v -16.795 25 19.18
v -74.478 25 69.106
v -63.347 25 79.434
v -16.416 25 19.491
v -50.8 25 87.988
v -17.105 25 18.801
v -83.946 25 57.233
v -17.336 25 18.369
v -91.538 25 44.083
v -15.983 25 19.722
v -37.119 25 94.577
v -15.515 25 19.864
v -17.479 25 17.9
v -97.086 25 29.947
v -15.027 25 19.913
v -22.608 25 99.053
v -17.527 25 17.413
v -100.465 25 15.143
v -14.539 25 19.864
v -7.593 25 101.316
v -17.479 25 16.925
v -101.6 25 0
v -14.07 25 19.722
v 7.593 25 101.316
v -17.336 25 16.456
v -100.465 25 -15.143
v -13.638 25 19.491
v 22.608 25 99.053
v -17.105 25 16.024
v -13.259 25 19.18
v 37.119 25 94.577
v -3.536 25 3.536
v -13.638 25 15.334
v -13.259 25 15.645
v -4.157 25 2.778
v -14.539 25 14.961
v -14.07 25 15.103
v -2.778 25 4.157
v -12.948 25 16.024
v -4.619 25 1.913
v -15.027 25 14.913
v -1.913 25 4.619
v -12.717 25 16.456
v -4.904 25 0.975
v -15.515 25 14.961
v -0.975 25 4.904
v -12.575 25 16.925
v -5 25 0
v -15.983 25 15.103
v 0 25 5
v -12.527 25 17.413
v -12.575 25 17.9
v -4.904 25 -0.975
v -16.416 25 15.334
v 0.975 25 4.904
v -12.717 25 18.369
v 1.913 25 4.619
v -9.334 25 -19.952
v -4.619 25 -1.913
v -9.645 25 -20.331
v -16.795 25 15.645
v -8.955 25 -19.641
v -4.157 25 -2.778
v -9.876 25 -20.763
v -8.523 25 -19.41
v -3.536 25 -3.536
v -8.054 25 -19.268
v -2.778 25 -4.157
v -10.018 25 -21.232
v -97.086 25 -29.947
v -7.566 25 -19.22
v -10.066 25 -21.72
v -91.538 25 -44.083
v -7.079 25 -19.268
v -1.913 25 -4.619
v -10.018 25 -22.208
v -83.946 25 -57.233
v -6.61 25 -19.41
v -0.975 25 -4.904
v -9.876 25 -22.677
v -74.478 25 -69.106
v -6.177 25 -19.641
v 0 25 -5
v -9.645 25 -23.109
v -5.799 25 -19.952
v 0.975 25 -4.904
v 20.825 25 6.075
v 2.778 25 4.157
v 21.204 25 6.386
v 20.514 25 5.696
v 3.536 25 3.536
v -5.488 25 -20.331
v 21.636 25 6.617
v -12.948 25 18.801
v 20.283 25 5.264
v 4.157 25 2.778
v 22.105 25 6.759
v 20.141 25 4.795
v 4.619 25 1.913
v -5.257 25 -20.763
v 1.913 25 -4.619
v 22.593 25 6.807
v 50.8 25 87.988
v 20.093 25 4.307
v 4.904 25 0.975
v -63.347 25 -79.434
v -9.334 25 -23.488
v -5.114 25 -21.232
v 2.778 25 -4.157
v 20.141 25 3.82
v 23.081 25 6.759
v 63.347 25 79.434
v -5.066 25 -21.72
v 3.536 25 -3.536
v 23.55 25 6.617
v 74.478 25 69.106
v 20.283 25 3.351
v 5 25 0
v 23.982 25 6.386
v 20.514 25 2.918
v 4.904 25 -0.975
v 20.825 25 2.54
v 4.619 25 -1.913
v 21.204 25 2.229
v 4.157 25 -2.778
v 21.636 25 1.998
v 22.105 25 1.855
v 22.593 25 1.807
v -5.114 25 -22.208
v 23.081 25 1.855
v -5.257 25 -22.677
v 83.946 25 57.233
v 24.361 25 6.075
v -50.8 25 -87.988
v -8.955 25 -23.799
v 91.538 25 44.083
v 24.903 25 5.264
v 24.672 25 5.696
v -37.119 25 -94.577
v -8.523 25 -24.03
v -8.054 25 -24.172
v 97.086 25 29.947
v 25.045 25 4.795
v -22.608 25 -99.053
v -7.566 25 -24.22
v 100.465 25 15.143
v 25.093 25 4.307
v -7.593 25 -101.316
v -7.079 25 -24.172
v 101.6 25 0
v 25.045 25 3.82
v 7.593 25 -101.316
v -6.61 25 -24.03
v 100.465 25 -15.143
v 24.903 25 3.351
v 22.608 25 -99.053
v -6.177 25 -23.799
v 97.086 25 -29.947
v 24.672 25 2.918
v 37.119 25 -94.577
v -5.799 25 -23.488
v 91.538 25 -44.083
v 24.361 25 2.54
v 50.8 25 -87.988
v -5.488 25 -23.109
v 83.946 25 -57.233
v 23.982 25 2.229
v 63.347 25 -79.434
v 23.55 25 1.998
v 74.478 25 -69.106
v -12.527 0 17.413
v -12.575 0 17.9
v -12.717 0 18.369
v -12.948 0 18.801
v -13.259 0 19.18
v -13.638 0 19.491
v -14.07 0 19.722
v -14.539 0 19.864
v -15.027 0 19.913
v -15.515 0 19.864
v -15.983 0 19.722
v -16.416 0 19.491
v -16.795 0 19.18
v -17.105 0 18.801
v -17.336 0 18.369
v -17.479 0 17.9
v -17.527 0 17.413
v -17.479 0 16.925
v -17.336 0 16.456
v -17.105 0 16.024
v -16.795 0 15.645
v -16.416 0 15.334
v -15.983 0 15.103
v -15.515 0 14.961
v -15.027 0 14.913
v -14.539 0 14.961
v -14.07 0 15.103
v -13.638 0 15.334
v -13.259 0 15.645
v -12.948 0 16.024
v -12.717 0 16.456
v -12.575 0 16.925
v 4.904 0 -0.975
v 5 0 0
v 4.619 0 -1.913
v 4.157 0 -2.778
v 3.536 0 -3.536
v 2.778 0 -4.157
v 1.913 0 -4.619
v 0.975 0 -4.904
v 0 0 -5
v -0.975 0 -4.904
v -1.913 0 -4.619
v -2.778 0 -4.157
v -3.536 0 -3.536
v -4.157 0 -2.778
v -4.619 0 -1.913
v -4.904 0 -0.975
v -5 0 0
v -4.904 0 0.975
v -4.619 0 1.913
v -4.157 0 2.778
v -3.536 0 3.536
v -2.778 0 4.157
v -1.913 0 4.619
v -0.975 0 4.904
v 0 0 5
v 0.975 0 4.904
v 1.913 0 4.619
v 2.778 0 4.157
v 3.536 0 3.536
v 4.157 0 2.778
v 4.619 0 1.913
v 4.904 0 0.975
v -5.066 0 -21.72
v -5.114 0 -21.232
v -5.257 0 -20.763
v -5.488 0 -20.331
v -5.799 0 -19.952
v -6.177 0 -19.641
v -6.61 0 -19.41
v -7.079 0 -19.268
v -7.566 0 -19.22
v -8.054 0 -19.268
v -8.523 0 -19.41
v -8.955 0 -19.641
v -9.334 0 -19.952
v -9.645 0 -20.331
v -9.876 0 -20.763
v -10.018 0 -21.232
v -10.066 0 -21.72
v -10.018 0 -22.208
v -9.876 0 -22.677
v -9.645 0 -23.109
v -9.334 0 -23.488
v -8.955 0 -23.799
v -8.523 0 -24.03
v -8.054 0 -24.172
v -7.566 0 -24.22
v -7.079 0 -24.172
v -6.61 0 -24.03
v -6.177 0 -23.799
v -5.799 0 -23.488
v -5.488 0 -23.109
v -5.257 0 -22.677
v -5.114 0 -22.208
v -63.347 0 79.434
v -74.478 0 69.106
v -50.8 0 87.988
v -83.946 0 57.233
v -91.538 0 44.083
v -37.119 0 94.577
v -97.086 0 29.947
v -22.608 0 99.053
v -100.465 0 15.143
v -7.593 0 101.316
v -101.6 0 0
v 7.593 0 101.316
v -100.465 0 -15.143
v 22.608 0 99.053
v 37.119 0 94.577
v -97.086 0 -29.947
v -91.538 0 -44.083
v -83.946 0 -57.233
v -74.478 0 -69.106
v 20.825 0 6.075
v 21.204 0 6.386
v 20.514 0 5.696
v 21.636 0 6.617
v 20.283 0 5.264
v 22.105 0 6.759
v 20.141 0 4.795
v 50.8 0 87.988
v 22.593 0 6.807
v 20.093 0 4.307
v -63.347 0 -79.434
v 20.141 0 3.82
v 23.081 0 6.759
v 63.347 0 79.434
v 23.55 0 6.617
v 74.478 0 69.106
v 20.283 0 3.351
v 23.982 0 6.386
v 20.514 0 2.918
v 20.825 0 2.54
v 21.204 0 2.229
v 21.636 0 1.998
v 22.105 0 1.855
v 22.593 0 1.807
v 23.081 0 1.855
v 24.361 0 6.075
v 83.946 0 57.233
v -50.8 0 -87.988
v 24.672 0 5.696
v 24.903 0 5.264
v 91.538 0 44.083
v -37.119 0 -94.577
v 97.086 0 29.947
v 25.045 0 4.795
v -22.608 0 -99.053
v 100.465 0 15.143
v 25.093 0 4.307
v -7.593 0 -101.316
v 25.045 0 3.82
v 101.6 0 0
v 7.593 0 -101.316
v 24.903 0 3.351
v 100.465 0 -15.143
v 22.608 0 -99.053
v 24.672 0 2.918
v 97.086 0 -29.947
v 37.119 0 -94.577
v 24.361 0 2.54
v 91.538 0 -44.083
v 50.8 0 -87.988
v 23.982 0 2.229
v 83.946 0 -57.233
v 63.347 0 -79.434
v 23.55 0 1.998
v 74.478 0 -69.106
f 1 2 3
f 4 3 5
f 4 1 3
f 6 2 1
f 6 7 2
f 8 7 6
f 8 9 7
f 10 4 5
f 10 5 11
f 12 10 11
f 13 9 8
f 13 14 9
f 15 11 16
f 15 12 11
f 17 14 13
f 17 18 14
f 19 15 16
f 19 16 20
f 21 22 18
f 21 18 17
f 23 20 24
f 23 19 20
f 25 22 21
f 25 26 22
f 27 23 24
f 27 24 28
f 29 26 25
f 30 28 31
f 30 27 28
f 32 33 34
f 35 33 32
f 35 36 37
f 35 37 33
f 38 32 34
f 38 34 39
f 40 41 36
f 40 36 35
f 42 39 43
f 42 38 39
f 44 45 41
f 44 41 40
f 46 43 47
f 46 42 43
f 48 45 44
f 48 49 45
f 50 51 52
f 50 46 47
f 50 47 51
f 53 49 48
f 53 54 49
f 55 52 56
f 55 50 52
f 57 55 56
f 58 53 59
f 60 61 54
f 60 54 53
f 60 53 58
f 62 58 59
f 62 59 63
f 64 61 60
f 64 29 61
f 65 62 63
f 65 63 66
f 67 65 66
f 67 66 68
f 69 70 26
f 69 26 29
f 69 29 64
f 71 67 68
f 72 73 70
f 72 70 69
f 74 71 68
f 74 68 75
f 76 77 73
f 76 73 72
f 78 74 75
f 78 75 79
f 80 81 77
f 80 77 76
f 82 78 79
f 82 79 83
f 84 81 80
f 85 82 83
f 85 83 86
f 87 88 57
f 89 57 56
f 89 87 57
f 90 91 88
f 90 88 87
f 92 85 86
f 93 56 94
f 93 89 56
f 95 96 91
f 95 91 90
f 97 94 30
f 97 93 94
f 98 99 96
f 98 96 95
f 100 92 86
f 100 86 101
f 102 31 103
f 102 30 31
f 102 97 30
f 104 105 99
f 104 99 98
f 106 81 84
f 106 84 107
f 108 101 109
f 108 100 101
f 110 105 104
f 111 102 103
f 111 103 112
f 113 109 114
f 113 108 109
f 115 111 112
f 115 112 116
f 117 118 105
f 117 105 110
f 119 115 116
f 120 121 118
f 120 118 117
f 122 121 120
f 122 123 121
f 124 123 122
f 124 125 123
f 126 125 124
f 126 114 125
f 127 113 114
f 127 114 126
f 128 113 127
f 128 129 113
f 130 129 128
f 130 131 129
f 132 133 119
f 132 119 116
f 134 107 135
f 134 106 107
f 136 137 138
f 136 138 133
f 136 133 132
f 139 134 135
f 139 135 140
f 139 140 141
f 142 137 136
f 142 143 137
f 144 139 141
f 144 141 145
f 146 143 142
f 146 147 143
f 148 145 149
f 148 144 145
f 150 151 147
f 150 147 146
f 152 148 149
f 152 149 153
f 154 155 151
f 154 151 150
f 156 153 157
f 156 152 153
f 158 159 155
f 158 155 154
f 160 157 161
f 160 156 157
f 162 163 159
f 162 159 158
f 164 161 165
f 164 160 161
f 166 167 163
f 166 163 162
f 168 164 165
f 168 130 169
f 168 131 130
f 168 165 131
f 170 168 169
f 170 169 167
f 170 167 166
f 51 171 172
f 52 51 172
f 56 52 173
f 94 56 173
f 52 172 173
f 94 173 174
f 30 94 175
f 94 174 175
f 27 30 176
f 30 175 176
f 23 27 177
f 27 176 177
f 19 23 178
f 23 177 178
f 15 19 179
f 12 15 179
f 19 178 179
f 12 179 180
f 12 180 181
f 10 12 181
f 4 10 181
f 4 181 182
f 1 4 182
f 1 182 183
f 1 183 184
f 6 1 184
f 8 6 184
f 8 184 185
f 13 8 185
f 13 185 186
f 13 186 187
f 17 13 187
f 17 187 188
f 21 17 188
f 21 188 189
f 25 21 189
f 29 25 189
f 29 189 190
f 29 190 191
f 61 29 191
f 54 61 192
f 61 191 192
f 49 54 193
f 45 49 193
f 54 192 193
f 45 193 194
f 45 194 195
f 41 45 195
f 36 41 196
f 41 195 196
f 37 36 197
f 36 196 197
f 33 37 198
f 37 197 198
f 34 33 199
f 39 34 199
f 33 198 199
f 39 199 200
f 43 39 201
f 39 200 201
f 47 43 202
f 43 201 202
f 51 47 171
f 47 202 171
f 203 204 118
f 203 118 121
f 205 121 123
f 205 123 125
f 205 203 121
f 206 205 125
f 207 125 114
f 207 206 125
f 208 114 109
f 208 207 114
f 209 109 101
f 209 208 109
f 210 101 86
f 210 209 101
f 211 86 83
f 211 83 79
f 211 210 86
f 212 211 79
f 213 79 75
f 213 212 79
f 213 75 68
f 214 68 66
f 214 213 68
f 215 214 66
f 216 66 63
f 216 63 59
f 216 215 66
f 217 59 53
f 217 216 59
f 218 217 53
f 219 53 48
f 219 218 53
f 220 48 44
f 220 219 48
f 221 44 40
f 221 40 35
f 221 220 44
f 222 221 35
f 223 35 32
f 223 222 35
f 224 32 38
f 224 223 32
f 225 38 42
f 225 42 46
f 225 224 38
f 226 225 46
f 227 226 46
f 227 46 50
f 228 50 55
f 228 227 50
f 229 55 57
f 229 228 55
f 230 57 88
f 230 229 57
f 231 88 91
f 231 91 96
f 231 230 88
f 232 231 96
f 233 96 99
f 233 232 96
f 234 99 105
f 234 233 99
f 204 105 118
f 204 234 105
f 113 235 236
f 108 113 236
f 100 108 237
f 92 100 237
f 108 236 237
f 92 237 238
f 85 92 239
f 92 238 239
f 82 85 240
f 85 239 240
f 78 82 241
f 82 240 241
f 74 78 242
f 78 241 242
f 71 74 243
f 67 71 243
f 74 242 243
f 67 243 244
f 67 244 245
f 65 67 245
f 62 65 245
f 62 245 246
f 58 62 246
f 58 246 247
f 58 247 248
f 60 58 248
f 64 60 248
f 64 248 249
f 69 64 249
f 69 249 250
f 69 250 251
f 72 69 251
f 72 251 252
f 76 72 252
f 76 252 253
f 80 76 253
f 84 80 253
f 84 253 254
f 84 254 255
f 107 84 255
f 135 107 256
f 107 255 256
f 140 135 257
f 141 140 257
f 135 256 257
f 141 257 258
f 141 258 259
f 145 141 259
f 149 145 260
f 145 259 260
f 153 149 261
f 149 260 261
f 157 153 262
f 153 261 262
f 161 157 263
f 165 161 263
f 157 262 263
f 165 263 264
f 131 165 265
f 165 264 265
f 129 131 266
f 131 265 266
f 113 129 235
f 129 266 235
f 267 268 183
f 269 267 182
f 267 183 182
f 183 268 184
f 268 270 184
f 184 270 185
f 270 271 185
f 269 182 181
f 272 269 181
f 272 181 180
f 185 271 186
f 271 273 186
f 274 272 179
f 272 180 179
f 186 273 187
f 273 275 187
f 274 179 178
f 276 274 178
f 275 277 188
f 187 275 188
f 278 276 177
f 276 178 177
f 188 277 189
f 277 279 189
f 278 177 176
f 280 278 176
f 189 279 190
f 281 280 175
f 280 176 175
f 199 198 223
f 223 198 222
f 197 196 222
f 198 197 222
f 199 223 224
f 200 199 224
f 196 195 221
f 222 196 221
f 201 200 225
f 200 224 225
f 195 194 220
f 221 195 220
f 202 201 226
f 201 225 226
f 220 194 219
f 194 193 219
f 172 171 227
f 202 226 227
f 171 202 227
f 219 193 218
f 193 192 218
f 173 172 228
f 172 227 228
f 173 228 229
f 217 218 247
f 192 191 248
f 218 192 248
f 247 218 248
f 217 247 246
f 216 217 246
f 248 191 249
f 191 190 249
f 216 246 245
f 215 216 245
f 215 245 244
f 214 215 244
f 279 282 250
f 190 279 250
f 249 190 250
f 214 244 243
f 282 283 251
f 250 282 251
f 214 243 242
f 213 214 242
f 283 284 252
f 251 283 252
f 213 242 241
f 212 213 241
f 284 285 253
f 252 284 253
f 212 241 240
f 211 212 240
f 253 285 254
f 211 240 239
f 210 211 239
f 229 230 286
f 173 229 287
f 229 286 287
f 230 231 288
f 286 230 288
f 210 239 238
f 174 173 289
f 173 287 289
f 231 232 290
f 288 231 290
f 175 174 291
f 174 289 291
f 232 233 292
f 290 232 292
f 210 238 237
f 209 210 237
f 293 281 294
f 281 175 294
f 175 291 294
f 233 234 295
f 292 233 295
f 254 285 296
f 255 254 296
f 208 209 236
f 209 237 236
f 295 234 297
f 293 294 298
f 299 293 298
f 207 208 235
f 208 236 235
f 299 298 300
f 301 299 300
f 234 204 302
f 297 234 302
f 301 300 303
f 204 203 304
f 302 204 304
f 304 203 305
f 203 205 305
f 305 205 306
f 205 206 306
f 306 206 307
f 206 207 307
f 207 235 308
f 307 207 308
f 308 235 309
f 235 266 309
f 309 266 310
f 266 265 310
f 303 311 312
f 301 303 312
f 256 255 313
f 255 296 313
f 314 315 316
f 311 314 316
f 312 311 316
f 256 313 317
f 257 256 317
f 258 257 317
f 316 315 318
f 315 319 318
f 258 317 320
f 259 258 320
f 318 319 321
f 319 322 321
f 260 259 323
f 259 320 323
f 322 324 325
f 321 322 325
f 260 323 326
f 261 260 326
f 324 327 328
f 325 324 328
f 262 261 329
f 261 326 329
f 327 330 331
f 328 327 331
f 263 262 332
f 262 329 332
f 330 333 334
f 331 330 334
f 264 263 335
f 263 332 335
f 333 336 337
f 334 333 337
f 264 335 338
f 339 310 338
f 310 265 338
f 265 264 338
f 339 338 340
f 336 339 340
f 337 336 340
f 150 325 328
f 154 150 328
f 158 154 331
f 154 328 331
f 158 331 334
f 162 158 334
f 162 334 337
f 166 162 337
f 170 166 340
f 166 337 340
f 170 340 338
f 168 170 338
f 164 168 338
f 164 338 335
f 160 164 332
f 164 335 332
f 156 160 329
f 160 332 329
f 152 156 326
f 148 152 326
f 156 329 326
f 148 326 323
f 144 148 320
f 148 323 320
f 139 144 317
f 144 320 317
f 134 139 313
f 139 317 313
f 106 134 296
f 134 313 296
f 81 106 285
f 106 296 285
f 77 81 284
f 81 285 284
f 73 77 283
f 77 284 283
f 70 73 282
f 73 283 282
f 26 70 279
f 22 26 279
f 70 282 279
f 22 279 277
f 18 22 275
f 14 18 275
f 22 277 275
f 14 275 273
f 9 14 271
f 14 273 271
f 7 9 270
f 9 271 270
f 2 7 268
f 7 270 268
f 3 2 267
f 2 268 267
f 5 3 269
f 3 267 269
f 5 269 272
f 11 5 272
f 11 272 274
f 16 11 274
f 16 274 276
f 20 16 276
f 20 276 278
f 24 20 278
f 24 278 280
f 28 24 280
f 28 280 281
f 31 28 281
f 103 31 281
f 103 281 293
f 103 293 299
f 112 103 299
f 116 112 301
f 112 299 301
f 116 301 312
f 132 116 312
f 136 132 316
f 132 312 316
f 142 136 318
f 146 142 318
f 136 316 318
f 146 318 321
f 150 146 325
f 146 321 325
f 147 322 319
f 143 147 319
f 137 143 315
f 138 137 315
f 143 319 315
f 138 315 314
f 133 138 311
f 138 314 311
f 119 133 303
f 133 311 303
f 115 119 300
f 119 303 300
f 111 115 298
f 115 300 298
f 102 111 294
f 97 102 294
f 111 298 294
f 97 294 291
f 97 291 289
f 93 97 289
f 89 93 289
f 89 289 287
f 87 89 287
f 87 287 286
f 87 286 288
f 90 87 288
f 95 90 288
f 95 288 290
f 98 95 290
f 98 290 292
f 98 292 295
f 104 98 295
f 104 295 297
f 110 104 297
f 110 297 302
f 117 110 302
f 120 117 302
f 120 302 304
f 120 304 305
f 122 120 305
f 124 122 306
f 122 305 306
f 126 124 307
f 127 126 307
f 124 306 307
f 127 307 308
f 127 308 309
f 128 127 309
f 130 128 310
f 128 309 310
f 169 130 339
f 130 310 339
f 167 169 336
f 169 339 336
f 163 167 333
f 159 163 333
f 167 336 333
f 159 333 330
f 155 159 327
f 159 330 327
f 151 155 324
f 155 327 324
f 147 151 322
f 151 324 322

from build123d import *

# Parameters (mm, degrees)
SKETCH1_R           = 101.6
SKETCH1_R_2         = 5
BOSS_EXTRUDE8_DEPTH = 25
SKETCH2_R           = 2.5
CUT_EXTRUDE1_DEPTH  = 26


with BuildPart() as part:
    # Sketch1 → Boss-Extrude8 (new body)
    with BuildSketch(Plane(origin=(0, 0, 0), x_dir=(1, 0, 0), z_dir=(0, 1, 0))):
        Circle(SKETCH1_R)
        Circle(SKETCH1_R_2, mode=Mode.SUBTRACT)
    extrude(amount=BOSS_EXTRUDE8_DEPTH)

    # Sketch2 → Cut-Extrude1 (cut, through all)
    with BuildSketch(Plane.XZ):
        with Locations((22.59307321, 4.307324334)):
            Circle(SKETCH2_R)
        with Locations((-7.56628431, -21.719837517)):
            Circle(SKETCH2_R)
        with Locations((-15.026788901, 17.412513183)):
            Circle(SKETCH2_R)
    extrude(amount=-CUT_EXTRUDE1_DEPTH, mode=Mode.SUBTRACT)


solid = part.part
